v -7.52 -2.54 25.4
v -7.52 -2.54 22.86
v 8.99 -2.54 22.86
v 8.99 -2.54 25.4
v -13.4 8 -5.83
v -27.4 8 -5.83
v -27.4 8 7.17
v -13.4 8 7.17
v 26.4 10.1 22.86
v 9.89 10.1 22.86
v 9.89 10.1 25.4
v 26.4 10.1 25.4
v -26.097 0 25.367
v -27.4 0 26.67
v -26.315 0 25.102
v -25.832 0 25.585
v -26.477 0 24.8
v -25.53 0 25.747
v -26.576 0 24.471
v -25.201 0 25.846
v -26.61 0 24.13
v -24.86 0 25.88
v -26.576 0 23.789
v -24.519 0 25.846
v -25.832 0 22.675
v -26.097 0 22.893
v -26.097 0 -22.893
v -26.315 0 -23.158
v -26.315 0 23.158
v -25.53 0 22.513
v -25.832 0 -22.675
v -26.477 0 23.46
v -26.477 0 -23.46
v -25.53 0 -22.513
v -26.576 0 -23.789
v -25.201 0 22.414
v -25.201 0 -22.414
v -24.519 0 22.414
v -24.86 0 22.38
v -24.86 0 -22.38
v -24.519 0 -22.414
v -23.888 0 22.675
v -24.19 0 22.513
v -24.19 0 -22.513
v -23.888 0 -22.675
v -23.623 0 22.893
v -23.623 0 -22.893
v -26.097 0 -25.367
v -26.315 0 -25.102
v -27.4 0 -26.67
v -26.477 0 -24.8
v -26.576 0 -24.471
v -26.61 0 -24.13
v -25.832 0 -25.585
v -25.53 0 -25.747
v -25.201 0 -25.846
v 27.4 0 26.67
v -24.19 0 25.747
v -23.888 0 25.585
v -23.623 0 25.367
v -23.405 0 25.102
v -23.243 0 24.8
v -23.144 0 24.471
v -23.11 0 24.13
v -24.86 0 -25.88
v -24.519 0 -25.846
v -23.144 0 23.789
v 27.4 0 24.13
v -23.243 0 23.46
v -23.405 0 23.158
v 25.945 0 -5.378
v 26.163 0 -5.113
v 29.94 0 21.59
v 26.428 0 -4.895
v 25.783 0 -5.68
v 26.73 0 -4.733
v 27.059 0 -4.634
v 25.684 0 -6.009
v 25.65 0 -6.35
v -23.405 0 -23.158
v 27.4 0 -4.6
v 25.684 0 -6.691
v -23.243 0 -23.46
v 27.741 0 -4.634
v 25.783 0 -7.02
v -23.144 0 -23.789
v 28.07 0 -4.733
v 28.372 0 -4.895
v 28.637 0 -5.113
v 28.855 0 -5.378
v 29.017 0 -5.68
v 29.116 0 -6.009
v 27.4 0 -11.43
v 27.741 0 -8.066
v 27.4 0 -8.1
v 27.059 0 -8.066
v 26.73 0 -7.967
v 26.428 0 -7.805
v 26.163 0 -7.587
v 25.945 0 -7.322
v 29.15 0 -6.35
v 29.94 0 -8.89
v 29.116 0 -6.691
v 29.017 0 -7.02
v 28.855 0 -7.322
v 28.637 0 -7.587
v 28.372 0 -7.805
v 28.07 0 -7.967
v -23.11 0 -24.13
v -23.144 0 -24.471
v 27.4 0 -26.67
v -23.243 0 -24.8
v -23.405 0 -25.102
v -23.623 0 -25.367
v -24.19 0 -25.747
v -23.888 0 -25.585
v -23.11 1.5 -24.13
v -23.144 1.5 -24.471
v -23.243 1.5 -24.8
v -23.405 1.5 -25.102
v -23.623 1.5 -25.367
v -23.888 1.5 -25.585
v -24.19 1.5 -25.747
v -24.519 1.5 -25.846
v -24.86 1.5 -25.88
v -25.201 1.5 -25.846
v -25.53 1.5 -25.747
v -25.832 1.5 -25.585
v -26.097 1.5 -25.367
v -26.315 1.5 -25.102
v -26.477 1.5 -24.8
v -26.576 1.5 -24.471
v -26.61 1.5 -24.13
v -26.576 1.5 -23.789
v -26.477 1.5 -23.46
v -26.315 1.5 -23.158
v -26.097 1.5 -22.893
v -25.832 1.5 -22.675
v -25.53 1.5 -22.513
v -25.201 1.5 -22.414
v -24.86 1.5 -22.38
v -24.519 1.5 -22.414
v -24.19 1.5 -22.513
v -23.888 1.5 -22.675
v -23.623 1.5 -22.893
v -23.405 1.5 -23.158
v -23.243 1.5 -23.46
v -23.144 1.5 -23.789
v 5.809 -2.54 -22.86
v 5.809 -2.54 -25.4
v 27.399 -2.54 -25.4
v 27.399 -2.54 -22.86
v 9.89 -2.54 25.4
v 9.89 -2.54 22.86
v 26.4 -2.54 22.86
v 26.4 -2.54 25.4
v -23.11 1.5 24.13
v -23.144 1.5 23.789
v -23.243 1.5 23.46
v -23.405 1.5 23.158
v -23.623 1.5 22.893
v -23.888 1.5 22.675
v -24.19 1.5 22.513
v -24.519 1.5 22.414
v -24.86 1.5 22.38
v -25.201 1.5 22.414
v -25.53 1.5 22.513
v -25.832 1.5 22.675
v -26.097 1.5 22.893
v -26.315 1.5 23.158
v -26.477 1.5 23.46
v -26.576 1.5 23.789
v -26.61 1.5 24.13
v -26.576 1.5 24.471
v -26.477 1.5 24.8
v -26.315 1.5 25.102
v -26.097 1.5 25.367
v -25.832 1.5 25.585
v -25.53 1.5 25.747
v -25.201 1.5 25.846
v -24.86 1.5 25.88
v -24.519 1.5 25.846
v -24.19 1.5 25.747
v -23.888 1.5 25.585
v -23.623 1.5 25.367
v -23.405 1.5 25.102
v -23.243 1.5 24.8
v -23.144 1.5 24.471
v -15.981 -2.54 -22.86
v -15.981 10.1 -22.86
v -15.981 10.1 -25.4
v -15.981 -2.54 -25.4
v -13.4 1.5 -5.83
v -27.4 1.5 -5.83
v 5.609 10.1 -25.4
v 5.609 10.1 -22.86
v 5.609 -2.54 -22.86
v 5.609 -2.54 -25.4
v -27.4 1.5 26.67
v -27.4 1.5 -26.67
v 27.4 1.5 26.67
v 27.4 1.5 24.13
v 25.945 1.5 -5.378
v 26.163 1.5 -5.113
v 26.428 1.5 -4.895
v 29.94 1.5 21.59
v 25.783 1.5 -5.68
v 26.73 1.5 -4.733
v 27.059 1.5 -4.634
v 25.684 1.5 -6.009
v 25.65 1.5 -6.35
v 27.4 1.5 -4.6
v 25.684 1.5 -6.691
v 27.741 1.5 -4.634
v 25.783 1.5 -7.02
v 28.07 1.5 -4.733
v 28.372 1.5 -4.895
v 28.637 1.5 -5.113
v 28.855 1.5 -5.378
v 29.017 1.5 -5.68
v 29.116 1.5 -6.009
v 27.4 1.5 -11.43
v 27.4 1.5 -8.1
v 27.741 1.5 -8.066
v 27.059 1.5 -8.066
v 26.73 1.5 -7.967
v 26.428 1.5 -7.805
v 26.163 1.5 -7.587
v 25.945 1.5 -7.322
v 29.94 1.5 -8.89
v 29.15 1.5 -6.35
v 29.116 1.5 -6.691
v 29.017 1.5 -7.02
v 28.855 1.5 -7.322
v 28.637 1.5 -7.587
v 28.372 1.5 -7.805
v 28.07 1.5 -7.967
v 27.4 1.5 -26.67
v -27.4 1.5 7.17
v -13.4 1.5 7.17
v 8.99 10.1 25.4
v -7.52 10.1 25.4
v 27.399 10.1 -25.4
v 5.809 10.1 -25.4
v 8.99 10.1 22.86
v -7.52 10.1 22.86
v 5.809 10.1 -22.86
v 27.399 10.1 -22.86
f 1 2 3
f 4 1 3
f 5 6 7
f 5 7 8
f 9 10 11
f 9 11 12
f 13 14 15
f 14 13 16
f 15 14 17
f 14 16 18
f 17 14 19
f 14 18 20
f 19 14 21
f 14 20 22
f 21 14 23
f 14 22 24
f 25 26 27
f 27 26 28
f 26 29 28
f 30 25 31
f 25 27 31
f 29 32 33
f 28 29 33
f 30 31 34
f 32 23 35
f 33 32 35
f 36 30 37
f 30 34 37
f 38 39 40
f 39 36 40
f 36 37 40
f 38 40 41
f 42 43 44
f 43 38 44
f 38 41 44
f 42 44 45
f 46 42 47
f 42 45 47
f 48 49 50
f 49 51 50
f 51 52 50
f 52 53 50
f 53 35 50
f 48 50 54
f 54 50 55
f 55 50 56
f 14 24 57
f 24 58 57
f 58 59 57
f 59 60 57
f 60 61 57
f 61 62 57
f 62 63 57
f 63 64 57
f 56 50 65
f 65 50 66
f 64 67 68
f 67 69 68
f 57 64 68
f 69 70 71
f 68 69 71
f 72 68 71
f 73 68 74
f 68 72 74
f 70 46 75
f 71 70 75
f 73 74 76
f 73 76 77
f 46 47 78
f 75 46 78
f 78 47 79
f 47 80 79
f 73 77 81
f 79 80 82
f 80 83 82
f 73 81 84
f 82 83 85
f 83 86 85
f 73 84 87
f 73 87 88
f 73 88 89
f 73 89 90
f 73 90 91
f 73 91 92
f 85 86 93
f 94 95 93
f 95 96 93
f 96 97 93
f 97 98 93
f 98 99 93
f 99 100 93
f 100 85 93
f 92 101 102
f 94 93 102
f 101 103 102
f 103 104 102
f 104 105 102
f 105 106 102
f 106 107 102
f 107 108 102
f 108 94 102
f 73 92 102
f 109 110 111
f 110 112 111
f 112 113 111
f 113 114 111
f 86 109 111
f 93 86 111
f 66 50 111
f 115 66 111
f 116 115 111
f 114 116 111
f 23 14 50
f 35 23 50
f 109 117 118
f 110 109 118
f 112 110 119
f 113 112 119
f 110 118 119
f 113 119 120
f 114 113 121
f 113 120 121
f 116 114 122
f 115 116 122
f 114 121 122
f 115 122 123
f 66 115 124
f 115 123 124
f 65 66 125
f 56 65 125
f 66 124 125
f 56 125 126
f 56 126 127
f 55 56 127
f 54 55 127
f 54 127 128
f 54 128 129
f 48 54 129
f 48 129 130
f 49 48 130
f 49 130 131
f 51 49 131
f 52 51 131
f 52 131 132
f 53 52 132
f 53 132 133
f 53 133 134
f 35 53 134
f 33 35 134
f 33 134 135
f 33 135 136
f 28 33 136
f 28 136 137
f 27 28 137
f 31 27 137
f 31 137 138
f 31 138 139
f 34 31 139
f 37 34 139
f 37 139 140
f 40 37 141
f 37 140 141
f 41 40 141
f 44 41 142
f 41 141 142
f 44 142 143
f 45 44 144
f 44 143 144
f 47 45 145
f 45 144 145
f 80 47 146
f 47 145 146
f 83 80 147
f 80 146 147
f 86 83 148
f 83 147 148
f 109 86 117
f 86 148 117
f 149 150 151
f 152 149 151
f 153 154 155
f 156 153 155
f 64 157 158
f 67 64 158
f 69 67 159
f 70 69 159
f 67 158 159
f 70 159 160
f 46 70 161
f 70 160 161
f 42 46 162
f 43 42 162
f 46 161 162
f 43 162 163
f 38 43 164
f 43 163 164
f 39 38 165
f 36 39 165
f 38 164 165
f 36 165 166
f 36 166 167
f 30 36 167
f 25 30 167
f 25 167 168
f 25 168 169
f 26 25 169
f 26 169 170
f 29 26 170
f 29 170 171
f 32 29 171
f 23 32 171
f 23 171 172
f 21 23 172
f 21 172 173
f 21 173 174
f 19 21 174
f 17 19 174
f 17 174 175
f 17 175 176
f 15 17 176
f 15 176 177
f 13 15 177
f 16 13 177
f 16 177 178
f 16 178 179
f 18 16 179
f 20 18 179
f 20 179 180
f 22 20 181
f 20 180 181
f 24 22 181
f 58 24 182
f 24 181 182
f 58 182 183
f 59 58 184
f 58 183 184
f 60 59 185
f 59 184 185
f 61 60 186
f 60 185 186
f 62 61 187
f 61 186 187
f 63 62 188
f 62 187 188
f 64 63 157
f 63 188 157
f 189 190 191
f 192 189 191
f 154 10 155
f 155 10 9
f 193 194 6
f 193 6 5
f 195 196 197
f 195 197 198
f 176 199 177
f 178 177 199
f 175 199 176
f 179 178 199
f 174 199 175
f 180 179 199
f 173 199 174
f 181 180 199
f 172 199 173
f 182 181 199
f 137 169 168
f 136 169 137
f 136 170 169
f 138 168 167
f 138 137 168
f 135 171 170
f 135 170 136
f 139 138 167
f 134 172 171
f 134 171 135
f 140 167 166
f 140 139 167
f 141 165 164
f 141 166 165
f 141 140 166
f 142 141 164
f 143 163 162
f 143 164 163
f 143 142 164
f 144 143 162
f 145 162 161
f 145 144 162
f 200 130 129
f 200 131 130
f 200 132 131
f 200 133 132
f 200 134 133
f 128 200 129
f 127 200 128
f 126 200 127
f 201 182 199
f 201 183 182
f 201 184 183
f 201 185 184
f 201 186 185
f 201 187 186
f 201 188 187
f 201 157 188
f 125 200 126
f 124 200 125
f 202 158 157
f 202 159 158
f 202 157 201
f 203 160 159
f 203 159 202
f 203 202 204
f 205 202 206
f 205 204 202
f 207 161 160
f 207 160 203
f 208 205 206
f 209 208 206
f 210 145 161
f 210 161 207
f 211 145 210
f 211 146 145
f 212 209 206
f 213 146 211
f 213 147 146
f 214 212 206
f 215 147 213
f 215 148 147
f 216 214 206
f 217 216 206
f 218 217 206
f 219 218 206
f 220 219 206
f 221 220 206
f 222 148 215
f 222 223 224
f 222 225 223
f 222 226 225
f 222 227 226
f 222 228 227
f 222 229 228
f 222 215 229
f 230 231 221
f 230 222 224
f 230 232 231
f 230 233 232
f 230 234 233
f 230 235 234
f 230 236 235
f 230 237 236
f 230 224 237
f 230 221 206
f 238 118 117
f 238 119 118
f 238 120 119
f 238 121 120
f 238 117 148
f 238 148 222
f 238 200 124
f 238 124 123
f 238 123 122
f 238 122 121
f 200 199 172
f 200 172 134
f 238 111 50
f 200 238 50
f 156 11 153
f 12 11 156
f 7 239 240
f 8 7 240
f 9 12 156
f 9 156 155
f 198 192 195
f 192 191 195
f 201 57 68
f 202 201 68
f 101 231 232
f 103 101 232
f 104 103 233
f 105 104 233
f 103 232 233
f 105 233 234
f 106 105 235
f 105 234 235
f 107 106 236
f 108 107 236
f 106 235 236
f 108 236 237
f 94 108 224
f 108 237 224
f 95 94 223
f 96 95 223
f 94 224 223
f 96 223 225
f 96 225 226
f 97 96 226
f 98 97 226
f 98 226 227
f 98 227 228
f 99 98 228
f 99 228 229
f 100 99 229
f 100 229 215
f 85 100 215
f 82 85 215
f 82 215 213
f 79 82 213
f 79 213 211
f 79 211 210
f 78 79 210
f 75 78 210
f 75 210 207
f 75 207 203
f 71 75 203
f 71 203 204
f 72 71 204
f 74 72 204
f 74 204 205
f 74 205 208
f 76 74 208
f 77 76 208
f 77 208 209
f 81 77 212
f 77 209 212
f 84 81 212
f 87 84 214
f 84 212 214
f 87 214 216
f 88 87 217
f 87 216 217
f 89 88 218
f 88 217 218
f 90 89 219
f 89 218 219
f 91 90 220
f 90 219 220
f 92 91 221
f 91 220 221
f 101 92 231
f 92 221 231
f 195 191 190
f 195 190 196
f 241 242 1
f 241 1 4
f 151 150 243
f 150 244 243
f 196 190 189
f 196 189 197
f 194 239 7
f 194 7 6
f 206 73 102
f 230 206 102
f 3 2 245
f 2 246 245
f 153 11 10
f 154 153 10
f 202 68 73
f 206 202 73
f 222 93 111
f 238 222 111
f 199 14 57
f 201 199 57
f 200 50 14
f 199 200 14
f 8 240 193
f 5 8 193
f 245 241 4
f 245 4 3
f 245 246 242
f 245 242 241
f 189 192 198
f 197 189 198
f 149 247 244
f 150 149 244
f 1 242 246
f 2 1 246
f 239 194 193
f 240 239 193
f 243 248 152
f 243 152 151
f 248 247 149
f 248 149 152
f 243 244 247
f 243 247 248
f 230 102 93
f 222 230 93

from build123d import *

# Parameters (mm, degrees)
BOSS_EXTRUDE1_DEPTH        = 1.5
SKETCH2_R                  = 1.75
CUT_EXTRUDE1_DEPTH         = 2.5
SKETCH3_W                  = 14
SKETCH3_H                  = 13
BOSS_EXTRUDE2_DEPTH        = 6.5
SKETCH4_W                  = 16.51
SKETCH4_H                  = 2.54
BOSS_EXTRUDE3_DEPTH        = 8.6
BOSS_EXTRUDE3_DEPTH_BACK   = 4.04
BOSS_EXTRUDE3_2_DEPTH      = 8.6
BOSS_EXTRUDE3_2_DEPTH_BACK = 4.04
SKETCH4_W_2                = 21.59
BOSS_EXTRUDE3_3_DEPTH      = 8.6
BOSS_EXTRUDE3_3_DEPTH_BACK = 4.04
BOSS_EXTRUDE3_4_DEPTH      = 8.6
BOSS_EXTRUDE3_4_DEPTH_BACK = 4.04


with BuildPart() as part:
    # Sketch1 → Boss-Extrude1 (new body)
    with BuildSketch(Plane(origin=(0, 0, 0), x_dir=(1, 0, 0), z_dir=(0, 1, 0))):
        Polygon((-27.4, -26.67), (27.4, -26.67), (27.4, -24.13), (29.94, -21.59), (29.94, 8.89), (27.4, 11.43), (27.4, 26.67), (-27.4, 26.67), align=None)
    extrude(amount=BOSS_EXTRUDE1_DEPTH)

    # Sketch2 → Cut-Extrude1 (cut, through all)
    with BuildSketch(Plane(origin=(0, 1.5, 0), x_dir=(1, 0, 0), z_dir=(0, 1, 0))):
        with Locations((-24.86, -24.13)):
            Circle(SKETCH2_R)
        with Locations((-24.86, 24.13)):
            Circle(SKETCH2_R)
        with Locations((27.4, 6.35)):
            Circle(SKETCH2_R)
    extrude(amount=-CUT_EXTRUDE1_DEPTH, mode=Mode.SUBTRACT)


with BuildPart() as body_2:
    # Sketch3 → Boss-Extrude2 (new body)
    with BuildSketch(Plane(origin=(0, 1.5, 0), x_dir=(1, 0, 0), z_dir=(0, 1, 0))):
        with Locations((-20.4, -0.67)):
            Rectangle(SKETCH3_W, SKETCH3_H)
    extrude(amount=BOSS_EXTRUDE2_DEPTH)


with BuildPart() as body_3:
    # Sketch4 → Boss-Extrude3 (new body, two sides)
    with BuildSketch(Plane(origin=(0, 1.5, 0), x_dir=(1, 0, 0), z_dir=(0, 1, 0))) as boss_extrude3_sk:
        with Locations((0.735, -24.13)):
            Rectangle(SKETCH4_W, SKETCH4_H)
    extrude(amount=BOSS_EXTRUDE3_DEPTH)
    extrude(boss_extrude3_sk.sketch, amount=-BOSS_EXTRUDE3_DEPTH_BACK)


with BuildPart() as body_4:
    # Sketch4 → Boss-Extrude3 2 (new body, two sides)
    with BuildSketch(Plane(origin=(0, 1.5, 0), x_dir=(1, 0, 0), z_dir=(0, 1, 0))) as boss_extrude3_2_sk:
        with Locations((18.145, -24.13)):
            Rectangle(SKETCH4_W, SKETCH4_H)
    extrude(amount=BOSS_EXTRUDE3_2_DEPTH)
    extrude(boss_extrude3_2_sk.sketch, amount=-BOSS_EXTRUDE3_2_DEPTH_BACK)


with BuildPart() as body_5:
    # Sketch4 → Boss-Extrude3 3 (new body, two sides)
    with BuildSketch(Plane(origin=(0, 1.5, 0), x_dir=(1, 0, 0), z_dir=(0, 1, 0))) as boss_extrude3_3_sk:
        with Locations((-5.186, 24.13)):
            Rectangle(SKETCH4_W_2, SKETCH4_H)
    extrude(amount=BOSS_EXTRUDE3_3_DEPTH)
    extrude(boss_extrude3_3_sk.sketch, amount=-BOSS_EXTRUDE3_3_DEPTH_BACK)


with BuildPart() as body_6:
    # Sketch4 → Boss-Extrude3 4 (new body, two sides)
    with BuildSketch(Plane(origin=(0, 1.5, 0), x_dir=(1, 0, 0), z_dir=(0, 1, 0))) as boss_extrude3_4_sk:
        with Locations((16.604, 24.13)):
            Rectangle(SKETCH4_W_2, SKETCH4_H)
    extrude(amount=BOSS_EXTRUDE3_4_DEPTH)
    extrude(boss_extrude3_4_sk.sketch, amount=-BOSS_EXTRUDE3_4_DEPTH_BACK)


solid = Compound([part.part, body_2.part, body_3.part, body_4.part, body_5.part, body_6.part])
